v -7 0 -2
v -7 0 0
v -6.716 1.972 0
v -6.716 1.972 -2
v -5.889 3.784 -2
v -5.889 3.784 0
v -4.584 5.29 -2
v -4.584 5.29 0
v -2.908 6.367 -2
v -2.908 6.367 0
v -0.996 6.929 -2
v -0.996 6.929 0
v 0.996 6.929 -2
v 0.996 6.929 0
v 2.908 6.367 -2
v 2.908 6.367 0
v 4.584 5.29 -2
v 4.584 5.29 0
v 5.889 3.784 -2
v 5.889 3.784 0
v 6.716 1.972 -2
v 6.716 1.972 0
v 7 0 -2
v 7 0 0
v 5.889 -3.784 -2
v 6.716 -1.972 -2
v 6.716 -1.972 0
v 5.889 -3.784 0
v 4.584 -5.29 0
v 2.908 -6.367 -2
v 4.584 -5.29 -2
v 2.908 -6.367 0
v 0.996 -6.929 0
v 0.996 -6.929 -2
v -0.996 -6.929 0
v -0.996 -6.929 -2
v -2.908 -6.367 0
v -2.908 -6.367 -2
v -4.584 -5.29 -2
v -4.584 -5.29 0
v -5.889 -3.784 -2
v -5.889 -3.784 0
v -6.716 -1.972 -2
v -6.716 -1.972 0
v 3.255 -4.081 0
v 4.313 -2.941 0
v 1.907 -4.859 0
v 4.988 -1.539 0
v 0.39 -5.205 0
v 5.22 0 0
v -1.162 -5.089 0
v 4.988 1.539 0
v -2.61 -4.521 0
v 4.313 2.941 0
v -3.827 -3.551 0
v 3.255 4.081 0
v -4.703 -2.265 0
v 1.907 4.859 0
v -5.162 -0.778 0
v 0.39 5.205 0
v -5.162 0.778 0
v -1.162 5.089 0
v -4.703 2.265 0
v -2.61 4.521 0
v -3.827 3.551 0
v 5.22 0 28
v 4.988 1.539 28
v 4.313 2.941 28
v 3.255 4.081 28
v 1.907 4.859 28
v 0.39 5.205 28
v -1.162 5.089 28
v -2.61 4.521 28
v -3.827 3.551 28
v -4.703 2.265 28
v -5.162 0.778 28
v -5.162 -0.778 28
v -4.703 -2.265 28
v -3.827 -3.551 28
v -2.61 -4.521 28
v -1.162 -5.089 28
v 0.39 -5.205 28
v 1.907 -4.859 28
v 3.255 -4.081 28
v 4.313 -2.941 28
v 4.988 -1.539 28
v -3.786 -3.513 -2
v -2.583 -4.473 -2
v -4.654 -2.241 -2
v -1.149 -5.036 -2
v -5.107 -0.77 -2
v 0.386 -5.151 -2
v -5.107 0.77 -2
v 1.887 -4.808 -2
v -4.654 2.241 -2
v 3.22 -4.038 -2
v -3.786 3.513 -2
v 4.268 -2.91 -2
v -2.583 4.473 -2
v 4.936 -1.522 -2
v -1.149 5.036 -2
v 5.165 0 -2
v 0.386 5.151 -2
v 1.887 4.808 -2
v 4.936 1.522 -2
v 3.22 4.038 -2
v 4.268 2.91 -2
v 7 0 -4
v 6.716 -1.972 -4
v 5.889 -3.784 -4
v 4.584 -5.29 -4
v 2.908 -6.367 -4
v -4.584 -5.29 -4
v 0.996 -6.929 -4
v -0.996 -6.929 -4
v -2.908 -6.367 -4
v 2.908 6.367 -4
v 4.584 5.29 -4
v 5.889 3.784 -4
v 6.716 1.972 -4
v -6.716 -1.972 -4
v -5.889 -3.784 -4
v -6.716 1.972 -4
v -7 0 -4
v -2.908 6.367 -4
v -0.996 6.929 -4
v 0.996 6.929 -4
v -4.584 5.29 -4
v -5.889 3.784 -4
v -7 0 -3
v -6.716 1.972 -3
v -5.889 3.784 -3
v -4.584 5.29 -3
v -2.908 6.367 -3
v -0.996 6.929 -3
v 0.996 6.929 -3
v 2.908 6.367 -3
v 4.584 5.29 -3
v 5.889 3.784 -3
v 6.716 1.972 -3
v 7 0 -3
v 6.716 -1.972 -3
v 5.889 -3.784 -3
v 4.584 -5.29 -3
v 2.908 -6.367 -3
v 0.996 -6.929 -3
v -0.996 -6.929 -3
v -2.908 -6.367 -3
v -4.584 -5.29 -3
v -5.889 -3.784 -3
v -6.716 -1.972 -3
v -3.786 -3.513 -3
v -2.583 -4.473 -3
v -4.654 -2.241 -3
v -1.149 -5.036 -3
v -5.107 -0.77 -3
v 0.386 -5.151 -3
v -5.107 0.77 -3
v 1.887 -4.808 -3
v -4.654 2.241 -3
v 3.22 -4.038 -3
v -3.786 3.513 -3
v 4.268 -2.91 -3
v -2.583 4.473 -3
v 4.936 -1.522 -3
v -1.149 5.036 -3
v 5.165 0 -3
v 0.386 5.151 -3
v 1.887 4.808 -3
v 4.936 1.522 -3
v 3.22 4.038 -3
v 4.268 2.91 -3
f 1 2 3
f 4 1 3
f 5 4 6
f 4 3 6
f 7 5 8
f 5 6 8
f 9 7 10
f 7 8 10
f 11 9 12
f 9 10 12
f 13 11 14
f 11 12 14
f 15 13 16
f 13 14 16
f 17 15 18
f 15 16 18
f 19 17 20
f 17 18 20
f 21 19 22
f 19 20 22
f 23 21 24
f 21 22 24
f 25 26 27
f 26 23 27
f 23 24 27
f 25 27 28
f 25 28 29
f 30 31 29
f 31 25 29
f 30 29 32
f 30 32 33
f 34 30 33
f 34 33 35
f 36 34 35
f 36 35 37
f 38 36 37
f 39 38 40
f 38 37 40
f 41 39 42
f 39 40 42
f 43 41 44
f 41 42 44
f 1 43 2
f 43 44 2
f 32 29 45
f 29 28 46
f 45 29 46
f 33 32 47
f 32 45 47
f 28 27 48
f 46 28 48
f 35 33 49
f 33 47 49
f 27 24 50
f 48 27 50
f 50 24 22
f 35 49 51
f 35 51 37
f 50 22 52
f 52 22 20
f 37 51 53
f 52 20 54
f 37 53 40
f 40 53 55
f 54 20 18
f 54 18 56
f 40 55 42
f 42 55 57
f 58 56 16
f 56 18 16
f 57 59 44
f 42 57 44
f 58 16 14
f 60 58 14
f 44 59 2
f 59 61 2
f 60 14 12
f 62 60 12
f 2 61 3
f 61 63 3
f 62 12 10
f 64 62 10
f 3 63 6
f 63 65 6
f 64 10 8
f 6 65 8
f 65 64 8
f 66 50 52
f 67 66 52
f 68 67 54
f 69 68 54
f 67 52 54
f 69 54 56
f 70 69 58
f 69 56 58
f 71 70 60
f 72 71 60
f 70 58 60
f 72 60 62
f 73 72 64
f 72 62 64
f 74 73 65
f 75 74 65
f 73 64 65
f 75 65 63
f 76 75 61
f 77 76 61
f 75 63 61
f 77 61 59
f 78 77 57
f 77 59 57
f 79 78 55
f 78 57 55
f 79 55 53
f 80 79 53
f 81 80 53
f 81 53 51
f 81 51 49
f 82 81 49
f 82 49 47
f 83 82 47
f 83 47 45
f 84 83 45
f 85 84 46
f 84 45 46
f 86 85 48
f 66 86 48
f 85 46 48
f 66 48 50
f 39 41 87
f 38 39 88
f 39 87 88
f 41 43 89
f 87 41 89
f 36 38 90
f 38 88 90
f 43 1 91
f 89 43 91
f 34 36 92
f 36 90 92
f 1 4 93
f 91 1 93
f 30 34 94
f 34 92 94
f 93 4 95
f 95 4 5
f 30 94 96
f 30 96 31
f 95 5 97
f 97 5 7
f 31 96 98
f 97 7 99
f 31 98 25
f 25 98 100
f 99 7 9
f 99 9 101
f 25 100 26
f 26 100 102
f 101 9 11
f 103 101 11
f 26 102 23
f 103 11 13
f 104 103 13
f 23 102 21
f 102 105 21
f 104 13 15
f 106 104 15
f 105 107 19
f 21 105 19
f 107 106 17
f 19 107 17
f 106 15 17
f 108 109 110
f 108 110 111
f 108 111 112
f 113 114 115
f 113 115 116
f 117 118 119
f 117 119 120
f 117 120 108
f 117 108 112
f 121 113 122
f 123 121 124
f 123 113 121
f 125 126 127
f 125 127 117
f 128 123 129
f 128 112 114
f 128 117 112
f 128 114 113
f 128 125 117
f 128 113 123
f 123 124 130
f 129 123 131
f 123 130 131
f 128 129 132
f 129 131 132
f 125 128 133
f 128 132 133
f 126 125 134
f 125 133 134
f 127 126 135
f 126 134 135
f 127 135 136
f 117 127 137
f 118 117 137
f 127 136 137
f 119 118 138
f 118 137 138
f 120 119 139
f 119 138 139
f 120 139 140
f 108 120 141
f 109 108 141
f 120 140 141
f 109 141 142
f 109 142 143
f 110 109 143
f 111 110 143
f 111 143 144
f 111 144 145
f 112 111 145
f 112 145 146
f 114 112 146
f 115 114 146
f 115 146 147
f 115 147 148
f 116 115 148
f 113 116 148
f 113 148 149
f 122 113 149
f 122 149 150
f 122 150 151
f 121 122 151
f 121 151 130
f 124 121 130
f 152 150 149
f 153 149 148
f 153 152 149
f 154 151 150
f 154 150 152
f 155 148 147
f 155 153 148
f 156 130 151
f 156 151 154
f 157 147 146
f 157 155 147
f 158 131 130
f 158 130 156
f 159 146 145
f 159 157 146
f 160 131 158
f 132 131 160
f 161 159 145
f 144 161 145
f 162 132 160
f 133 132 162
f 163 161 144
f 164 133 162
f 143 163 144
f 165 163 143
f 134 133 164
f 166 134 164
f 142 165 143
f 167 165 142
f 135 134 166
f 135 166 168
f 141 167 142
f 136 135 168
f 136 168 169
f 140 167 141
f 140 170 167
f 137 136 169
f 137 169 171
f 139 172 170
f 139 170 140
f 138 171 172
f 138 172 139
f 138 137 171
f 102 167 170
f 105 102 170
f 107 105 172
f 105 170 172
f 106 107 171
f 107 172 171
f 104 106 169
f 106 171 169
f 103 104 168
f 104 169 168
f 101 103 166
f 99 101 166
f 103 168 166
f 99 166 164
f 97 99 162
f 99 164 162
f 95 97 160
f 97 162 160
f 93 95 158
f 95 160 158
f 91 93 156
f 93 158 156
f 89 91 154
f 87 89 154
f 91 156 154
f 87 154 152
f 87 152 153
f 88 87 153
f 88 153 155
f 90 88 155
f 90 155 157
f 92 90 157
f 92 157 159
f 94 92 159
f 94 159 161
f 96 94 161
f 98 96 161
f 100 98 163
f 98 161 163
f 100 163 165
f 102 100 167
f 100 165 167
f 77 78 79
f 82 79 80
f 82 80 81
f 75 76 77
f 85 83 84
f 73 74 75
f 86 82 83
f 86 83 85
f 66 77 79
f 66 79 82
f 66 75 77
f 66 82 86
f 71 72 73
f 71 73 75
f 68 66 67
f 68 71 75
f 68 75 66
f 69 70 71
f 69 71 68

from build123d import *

# Parameters (mm, degrees)
SKETCH1_R                = 5.22
BOSS_EXTRUDE1_DEPTH      = 28
SKETCH2_R                = 7
BOSS_EXTRUDE2_DEPTH      = 4
CUT_EXTRUDE2_START       = -3
CUT_EXTRUDE2_OUTLINE_R   = 7
CUT_EXTRUDE2_OUTLINE_R_2 = 5.165
CUT_EXTRUDE2_DEPTH       = 1


# Read off the part's stored shape, not the designer's step: Cut-Extrude2
with BuildPart() as part:
    # Sketch1 → Boss-Extrude1 (new body)
    with BuildSketch(Plane.XY):
        Circle(SKETCH1_R)
    extrude(amount=BOSS_EXTRUDE1_DEPTH)

    # Sketch2 → Boss-Extrude2 (add)
    with BuildSketch(Plane(origin=(0, 0, 0), x_dir=(-1, 0, 0), z_dir=(0, 0, -1))):
        Circle(SKETCH2_R)
    extrude(amount=BOSS_EXTRUDE2_DEPTH)

    # Cut-Extrude2 outline → Cut-Extrude2 (cut)
    with BuildSketch(Plane.XY.offset(CUT_EXTRUDE2_START)):
        Circle(CUT_EXTRUDE2_OUTLINE_R)
        Circle(CUT_EXTRUDE2_OUTLINE_R_2, mode=Mode.SUBTRACT)
    extrude(amount=CUT_EXTRUDE2_DEPTH, mode=Mode.SUBTRACT)


solid = part.part
